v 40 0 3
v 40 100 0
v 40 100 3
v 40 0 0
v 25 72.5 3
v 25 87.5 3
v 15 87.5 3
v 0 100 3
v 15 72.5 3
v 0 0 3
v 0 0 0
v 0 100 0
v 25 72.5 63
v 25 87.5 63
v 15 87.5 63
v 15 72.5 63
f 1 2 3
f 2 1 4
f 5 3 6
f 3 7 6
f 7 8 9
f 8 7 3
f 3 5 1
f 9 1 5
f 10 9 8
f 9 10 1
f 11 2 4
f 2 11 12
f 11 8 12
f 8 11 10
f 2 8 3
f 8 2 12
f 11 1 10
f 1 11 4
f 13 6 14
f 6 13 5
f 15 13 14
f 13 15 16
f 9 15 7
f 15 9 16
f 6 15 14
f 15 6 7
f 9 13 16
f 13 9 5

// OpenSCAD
$fn = 50 * 1;

//  Length of the base plate
length = 100;

//  Width of the base plate
width = 40;

//  Thickness of the base plate
thickness = 3;

//  Displacement of the CENTER of the beam in x direction
dx = 20;

//  Displacement of the CENTER of the beam in y direction
dy = 80;

//  Thickness of the beam in x direction
beamWidth = 10;

//  Thickness of the beam in y direction
beamLength = 15;

//  Height of the beam
beamHeight = 60;

mount();

module mount()
{
    union()
    {
        cube([width, length, thickness]);
        translate([dx - beamWidth / 2, dy - beamLength / 2, thickness])
        {
            cube([beamWidth, beamLength, beamHeight]);
        }
    }
}
